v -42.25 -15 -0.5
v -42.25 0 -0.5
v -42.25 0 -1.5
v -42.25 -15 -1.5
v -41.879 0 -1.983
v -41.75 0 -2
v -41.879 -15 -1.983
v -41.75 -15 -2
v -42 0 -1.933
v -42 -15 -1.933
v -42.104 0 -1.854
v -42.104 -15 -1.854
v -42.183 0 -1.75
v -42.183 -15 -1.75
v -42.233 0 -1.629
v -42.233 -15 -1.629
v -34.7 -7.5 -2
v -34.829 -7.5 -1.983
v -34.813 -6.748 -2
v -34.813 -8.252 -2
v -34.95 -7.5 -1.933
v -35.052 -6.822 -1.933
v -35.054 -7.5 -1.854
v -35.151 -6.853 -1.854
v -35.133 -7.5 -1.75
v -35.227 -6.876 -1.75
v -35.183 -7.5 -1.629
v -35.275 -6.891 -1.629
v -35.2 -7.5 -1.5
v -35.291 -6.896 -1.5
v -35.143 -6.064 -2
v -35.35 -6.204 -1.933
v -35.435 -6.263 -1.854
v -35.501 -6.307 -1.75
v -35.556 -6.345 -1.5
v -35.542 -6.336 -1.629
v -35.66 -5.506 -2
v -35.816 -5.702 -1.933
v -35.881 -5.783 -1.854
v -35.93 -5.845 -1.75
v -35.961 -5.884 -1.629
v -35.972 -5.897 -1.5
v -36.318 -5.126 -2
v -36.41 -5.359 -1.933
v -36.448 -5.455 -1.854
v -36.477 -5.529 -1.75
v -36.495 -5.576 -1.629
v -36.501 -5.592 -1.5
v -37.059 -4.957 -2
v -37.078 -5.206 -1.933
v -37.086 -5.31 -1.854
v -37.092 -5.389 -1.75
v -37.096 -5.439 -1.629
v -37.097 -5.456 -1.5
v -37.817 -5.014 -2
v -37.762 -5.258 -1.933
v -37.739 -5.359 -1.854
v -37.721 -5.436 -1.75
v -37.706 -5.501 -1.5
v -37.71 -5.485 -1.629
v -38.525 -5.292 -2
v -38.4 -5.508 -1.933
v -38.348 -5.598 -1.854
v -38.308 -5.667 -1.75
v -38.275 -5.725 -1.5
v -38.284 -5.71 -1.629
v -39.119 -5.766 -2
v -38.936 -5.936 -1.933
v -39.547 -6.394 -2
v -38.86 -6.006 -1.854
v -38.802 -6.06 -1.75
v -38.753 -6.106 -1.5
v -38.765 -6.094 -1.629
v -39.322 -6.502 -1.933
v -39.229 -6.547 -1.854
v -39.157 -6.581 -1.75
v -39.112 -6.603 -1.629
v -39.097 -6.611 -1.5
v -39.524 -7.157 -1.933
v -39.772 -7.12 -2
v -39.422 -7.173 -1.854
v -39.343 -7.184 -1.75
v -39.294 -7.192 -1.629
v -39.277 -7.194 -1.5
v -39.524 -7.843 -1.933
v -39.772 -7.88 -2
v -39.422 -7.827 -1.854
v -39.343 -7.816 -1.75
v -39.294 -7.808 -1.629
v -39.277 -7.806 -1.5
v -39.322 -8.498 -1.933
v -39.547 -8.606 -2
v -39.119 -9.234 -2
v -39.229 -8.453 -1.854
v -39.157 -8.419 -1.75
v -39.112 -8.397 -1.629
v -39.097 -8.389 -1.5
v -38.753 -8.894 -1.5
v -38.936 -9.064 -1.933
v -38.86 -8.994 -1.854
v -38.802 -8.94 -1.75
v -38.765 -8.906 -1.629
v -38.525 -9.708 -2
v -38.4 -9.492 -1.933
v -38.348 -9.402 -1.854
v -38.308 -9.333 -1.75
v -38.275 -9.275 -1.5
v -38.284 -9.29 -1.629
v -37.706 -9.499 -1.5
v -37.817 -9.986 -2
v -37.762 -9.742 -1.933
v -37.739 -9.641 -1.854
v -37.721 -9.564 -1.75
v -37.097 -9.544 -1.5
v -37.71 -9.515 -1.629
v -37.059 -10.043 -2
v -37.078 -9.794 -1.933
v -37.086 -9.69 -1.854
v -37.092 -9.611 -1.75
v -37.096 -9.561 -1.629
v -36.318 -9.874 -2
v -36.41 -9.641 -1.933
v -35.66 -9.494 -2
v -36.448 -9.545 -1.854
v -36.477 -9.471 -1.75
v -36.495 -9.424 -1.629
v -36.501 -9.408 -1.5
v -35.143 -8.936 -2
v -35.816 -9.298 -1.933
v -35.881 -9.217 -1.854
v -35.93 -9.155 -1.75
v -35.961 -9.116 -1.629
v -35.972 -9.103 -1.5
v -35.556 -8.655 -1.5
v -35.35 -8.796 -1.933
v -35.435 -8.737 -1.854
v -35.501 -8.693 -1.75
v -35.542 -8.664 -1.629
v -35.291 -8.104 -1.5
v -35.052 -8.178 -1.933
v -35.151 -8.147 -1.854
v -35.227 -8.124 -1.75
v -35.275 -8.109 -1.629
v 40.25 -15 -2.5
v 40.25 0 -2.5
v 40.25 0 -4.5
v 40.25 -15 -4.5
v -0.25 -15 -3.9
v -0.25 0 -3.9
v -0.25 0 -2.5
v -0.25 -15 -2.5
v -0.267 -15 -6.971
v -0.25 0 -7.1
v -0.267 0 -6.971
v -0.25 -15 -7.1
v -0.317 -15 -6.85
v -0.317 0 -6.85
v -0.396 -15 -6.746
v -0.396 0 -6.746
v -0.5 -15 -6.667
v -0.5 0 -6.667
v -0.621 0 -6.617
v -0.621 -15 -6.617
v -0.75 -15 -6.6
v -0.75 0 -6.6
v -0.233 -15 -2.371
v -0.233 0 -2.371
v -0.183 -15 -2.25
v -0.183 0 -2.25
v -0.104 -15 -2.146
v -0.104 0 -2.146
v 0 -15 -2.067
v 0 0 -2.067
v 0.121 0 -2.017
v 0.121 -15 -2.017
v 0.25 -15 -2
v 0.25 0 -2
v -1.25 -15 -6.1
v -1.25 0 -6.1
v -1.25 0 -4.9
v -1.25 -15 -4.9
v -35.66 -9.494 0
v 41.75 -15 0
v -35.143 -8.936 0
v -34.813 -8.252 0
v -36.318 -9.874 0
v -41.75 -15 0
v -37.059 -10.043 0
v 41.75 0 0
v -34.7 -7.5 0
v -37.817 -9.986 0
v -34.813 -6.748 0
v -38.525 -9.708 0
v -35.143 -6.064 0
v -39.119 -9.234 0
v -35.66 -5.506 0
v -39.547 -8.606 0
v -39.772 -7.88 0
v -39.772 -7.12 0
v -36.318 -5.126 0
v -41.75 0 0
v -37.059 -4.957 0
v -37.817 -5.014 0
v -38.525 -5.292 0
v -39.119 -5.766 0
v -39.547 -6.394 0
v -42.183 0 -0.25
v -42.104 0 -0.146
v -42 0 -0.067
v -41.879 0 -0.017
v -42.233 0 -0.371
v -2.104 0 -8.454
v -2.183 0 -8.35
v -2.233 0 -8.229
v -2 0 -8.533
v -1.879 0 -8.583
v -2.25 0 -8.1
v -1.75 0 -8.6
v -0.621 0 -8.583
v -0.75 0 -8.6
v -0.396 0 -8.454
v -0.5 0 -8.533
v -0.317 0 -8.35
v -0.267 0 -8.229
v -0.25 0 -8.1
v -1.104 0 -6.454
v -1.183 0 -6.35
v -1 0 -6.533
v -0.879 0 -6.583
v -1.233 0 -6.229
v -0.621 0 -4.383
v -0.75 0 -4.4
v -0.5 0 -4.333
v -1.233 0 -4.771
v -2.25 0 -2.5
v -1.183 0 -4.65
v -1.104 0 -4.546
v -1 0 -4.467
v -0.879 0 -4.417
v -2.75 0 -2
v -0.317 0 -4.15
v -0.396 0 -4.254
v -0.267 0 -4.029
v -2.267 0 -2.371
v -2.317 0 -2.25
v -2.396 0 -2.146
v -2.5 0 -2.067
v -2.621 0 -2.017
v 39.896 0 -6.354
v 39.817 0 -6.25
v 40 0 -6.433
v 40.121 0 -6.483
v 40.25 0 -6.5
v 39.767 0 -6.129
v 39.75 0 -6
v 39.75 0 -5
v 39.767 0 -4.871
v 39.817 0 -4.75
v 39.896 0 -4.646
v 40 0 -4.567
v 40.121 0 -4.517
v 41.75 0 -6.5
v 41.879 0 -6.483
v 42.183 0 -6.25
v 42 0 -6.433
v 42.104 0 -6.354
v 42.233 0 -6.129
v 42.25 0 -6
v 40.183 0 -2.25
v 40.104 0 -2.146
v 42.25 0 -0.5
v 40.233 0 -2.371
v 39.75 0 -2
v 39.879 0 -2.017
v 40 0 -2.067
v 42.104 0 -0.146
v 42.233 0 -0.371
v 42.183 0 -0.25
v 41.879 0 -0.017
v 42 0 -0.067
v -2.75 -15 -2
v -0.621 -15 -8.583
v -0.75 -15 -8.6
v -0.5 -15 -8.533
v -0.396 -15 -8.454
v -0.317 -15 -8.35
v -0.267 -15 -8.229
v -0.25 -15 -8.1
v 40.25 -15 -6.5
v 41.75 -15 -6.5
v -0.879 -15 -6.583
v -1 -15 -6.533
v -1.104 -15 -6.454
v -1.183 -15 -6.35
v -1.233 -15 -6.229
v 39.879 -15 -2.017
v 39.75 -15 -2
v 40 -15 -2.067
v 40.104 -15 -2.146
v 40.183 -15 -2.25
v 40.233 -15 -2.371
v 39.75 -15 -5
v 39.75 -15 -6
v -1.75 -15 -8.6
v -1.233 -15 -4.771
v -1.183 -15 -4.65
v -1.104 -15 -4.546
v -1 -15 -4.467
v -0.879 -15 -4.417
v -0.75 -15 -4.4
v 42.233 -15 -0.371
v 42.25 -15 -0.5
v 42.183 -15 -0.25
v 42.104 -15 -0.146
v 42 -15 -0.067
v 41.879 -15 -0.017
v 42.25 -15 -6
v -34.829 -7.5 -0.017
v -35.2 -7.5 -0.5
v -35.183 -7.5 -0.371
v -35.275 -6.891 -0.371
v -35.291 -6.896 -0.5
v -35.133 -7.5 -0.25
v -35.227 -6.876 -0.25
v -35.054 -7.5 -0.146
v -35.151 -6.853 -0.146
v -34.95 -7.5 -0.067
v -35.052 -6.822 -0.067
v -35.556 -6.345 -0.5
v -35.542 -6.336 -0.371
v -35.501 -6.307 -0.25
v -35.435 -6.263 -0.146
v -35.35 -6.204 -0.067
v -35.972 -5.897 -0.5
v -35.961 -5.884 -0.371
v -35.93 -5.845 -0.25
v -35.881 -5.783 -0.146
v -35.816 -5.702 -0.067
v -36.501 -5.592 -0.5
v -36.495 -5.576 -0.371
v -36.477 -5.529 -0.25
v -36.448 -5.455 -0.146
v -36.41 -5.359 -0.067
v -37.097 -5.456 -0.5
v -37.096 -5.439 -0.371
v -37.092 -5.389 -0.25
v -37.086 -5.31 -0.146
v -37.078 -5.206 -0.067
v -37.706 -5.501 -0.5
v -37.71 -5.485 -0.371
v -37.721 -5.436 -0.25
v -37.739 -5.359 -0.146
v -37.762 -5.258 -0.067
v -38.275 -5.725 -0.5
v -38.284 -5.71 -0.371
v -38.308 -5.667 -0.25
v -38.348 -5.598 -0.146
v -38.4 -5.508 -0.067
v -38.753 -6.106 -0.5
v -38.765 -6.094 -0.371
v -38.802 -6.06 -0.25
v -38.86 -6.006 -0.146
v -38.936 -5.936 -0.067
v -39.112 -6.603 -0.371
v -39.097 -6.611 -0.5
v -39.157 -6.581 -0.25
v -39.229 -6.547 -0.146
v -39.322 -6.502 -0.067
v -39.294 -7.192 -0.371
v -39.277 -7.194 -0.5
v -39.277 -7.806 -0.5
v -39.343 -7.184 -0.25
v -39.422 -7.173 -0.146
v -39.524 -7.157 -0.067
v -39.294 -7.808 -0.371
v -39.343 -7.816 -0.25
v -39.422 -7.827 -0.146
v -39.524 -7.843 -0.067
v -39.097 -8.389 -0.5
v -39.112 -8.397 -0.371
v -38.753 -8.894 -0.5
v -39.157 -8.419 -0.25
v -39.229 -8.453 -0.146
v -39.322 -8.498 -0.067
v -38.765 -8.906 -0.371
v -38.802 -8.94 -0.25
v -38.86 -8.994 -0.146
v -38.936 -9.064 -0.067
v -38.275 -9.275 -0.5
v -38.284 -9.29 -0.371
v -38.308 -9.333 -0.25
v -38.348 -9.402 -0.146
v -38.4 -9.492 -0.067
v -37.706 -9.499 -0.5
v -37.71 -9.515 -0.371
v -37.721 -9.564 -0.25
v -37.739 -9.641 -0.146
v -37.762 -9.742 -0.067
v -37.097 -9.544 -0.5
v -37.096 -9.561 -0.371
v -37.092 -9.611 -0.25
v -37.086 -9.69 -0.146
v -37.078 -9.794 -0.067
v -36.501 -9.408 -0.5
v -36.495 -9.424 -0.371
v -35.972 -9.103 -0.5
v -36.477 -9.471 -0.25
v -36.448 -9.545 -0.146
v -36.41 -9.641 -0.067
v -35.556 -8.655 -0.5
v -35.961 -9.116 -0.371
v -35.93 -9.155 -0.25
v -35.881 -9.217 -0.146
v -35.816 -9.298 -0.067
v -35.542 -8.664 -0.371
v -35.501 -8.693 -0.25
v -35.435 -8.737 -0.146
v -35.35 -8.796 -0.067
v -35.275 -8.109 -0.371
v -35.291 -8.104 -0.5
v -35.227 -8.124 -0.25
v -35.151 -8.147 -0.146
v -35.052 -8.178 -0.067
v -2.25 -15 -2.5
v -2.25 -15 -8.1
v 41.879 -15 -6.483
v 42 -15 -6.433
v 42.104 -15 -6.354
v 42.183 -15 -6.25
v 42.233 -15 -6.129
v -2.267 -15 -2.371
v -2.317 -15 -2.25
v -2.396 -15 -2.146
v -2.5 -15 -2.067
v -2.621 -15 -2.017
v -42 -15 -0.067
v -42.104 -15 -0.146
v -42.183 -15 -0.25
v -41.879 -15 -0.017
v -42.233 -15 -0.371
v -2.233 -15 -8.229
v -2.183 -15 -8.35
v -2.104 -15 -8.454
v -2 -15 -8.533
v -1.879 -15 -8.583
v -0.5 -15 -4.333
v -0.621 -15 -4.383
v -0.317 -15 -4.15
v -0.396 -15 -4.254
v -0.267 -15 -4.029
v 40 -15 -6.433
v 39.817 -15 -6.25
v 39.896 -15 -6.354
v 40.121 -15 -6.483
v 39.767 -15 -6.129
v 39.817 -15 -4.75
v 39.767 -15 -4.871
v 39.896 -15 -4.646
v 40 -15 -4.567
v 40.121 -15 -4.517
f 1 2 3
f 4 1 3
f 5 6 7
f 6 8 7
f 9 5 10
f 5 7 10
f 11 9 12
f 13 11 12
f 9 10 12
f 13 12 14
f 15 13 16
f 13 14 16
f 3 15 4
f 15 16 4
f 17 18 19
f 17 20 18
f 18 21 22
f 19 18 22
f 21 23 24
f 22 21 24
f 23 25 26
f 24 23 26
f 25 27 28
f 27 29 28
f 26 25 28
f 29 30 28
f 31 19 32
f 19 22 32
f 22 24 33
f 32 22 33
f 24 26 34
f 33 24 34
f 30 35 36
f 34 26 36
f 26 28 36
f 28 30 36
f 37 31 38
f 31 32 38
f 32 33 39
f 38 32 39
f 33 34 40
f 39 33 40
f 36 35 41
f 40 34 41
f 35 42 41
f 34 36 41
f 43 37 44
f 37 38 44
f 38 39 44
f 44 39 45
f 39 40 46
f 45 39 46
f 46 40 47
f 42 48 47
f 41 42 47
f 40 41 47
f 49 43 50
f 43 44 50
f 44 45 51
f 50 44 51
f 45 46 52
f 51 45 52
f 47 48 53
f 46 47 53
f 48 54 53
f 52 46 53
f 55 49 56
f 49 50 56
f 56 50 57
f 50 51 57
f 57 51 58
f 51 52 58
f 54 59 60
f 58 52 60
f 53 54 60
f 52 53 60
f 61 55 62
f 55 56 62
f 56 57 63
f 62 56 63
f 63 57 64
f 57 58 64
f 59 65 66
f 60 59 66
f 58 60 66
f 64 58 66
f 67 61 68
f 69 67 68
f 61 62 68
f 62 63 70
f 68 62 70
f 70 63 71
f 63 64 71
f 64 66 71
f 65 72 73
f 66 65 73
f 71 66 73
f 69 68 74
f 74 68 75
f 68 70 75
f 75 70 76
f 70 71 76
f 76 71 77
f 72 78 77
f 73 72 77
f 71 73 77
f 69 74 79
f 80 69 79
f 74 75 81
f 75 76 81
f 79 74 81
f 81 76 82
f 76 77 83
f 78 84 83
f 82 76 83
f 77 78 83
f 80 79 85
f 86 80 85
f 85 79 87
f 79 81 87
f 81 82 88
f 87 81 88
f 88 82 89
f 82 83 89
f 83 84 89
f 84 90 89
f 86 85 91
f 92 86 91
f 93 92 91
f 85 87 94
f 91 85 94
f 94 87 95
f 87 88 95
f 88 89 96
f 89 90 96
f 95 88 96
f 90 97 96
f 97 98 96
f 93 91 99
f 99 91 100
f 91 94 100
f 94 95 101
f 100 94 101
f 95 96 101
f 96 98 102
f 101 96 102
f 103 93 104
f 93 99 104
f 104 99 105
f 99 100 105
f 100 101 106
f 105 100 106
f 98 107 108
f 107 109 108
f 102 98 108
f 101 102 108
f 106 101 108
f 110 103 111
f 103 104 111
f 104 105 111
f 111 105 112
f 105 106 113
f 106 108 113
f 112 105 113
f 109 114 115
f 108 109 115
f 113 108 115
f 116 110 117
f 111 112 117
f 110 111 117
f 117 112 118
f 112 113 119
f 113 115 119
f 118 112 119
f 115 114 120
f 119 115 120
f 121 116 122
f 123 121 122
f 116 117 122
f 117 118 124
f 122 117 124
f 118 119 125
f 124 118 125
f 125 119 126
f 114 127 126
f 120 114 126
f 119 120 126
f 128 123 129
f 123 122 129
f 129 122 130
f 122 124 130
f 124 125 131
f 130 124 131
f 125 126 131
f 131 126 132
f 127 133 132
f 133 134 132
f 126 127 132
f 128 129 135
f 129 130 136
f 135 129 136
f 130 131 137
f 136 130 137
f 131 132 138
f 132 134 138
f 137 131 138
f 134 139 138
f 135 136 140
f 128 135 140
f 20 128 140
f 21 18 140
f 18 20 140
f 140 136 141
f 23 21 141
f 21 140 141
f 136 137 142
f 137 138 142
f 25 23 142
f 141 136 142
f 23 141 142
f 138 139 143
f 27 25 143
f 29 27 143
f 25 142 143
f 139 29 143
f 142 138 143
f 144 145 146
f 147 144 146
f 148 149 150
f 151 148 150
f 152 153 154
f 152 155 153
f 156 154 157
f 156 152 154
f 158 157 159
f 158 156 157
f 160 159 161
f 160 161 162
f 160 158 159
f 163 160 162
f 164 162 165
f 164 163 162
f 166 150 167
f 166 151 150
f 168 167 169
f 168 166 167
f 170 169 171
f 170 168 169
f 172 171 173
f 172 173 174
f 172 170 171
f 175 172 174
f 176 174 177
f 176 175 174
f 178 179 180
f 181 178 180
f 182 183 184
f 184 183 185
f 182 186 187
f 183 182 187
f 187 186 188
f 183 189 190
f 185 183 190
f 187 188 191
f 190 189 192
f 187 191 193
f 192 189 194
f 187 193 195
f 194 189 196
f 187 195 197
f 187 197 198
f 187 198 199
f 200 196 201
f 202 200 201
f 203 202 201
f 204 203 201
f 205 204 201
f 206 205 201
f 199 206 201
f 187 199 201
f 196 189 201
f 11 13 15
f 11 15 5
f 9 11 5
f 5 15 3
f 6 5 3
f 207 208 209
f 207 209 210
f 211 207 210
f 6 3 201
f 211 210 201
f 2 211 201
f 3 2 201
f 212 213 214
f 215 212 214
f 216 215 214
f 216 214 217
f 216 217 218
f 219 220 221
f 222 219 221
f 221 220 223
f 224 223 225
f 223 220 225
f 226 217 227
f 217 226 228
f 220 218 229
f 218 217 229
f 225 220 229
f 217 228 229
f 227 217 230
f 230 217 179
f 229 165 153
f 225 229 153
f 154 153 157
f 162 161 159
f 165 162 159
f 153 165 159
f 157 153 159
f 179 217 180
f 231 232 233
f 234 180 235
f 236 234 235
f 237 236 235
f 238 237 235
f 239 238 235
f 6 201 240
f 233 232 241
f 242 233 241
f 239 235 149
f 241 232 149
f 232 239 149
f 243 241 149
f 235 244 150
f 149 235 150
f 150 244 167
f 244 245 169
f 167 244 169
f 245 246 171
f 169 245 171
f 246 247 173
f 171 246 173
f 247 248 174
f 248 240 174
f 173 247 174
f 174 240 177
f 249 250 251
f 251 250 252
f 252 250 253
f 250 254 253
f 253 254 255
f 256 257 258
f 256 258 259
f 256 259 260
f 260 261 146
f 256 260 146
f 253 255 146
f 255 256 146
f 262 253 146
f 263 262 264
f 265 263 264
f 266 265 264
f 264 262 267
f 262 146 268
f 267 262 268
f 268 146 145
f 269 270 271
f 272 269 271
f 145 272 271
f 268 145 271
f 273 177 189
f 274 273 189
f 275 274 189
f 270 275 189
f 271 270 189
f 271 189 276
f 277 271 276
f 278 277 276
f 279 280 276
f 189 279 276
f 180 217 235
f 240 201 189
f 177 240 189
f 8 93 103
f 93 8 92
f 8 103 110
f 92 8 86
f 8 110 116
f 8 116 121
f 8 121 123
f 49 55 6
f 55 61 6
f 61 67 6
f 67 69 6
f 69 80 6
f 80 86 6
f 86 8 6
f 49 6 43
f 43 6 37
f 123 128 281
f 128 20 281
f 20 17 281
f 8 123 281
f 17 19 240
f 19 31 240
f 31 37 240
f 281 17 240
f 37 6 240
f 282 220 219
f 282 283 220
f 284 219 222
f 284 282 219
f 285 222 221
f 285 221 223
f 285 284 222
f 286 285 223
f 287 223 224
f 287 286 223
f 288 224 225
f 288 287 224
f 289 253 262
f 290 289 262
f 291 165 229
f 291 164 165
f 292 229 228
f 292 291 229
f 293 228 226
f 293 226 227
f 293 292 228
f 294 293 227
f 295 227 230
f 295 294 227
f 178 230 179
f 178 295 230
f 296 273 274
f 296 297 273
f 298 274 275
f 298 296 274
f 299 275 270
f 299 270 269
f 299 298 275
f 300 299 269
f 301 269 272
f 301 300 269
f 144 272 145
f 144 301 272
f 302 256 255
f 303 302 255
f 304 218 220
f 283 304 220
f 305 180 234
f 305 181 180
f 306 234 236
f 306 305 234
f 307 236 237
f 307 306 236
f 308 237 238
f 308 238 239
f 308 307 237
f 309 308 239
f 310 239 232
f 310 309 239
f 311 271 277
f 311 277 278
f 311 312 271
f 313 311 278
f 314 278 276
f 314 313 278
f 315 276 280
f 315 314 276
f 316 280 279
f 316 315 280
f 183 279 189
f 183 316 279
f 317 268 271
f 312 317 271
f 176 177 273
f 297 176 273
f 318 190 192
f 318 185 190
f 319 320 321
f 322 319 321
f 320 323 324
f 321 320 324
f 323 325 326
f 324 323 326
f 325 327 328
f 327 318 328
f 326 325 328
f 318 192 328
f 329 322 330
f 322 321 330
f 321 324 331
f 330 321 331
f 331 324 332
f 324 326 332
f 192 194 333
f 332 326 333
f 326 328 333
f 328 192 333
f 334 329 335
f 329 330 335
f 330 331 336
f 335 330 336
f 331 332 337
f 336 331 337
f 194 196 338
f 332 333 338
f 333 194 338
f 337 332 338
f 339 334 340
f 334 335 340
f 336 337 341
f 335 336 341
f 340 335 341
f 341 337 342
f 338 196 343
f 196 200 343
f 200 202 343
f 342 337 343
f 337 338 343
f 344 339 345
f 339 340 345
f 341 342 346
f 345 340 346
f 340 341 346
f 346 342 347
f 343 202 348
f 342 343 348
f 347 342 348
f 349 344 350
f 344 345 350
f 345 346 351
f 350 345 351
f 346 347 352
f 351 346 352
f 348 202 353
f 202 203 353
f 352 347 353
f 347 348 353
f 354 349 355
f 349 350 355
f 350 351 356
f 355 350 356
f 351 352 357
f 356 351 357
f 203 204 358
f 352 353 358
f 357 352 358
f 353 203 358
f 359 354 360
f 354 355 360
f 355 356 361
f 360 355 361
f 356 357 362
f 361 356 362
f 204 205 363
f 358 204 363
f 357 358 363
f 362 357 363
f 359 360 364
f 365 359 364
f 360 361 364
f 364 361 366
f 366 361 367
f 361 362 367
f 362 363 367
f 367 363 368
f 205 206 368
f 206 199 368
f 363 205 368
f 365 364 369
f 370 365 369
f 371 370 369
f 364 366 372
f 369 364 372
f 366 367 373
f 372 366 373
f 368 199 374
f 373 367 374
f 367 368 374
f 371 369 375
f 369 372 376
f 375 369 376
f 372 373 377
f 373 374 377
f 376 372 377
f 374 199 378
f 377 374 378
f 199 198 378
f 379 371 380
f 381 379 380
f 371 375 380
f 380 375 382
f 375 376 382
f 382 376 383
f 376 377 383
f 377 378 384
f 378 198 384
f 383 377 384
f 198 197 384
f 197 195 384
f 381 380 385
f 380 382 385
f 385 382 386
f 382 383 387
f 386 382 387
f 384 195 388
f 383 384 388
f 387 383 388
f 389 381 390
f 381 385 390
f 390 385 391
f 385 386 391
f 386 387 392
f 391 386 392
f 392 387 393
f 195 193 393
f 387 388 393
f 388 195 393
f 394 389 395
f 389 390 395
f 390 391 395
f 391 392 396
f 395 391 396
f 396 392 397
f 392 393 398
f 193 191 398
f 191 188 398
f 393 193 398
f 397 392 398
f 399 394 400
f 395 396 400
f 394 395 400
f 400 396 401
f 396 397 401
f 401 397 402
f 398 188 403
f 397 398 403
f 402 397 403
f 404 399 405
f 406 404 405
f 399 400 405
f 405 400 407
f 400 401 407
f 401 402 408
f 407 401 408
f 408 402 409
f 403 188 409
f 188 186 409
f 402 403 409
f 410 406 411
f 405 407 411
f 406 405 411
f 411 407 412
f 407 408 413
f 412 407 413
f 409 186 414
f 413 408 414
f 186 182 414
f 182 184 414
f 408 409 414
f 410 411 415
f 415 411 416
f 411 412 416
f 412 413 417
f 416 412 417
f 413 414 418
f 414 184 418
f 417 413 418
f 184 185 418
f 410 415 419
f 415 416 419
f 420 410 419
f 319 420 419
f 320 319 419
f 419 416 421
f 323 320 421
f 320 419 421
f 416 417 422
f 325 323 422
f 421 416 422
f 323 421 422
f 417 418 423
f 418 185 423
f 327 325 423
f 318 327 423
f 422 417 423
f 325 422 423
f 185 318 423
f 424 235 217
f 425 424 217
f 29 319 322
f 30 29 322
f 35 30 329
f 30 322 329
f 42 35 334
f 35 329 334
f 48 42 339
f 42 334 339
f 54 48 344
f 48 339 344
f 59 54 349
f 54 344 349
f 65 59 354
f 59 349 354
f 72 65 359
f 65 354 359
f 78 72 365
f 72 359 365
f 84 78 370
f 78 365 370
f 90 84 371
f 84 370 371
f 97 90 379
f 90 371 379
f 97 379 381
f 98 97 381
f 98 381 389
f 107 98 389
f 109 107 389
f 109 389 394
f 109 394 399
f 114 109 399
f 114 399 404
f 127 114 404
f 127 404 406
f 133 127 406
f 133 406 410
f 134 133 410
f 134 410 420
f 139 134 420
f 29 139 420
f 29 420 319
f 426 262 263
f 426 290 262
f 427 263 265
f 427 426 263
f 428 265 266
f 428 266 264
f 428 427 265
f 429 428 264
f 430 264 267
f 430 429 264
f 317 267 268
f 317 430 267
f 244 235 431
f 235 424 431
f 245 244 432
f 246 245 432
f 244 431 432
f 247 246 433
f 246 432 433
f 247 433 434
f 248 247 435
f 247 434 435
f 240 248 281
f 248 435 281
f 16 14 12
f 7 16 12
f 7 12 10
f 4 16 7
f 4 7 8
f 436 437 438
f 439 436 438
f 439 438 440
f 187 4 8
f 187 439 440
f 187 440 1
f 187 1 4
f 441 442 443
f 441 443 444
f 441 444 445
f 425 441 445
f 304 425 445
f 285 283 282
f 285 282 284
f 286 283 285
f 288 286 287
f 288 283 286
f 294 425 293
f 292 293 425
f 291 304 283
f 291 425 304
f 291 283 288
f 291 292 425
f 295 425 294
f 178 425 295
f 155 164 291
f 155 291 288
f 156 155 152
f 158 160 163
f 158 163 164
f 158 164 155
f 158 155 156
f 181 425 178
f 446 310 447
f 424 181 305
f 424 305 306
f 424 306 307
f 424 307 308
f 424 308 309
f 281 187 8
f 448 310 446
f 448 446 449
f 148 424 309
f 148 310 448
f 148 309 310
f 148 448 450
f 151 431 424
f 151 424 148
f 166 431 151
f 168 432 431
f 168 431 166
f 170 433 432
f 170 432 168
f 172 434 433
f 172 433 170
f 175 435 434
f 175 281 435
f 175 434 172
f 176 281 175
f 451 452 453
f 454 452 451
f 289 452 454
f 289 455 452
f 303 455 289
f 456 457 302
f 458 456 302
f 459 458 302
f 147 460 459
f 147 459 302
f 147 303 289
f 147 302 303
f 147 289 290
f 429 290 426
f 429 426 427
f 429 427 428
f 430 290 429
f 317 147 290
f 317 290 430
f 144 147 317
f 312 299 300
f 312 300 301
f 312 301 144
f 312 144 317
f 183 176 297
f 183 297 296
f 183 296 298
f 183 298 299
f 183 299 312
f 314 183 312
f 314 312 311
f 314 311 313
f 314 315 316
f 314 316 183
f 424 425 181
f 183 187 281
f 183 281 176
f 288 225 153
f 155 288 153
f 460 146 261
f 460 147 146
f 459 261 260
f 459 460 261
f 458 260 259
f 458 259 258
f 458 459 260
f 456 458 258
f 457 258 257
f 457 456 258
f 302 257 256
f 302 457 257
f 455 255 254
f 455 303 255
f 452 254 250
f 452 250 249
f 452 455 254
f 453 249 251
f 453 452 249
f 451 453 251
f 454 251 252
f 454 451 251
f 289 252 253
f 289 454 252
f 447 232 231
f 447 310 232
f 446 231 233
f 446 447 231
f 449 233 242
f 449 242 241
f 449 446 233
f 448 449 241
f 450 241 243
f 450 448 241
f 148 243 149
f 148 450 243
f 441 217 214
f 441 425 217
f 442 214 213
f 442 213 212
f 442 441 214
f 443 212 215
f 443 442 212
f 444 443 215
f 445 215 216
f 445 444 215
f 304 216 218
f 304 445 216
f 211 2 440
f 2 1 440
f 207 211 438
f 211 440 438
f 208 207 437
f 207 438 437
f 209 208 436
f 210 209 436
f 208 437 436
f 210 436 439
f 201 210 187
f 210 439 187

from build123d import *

# Parameters (mm, degrees)
F1_DEPTH = 15
F2_R     = 2.05
F3_DEPTH = 25
F4_R     = 0.49999


# Not quite as in the source:
# - a fillet or chamfer is up to 0.001 mm smaller than in the source, because OpenCascade refuses the exact size


with BuildPart() as f1:
    # F0 (on Front) → F1 (new body)
    with BuildSketch(Plane.XZ):
        Polygon((-0.25, -2), (-2.25, -2), (-2.25, -8.6), (-0.25, -8.6), (-0.25, -6.6), (-1.25, -6.6), (-1.25, -4.4), (-0.25, -4.4), align=None)
        Polygon((42.25, 0), (-42.25, 0), (-42.25, -2), (-2.25, -2), (-0.25, -2), (40.25, -2), (42.25, -2), align=None)
        Polygon((42.25, -6.5), (42.25, -2), (40.25, -2), (40.25, -4.5), (39.75, -4.5), (39.75, -6.5), align=None)
    extrude(amount=F1_DEPTH)

    # F2 (on face) → F3 (cut)
    with BuildSketch(Plane.XY):
        with Locations((-37.25, -7.5)):
            Circle(F2_R)
    extrude(amount=-F3_DEPTH, mode=Mode.SUBTRACT)

    # F4 (radius 0.5 in the source; OpenCascade refuses exactly that, so slightly less here)
    f4_edges = [f1.edges().sort_by_distance(p)[0] for p in [
        (-1.25, -7.5, -6.6),
        (-0.25, -7.5, -8.6),
        (39.75, -7.5, -6.5),
        (39.75, -7.5, -4.5),
        (-39.3, -7.5, 0),
        (42.25, -7.5, 0),
        (42.25, -7.5, -6.5),
        (-42.25, -7.5, 0),
        (-42.25, -7.5, -2),
        (-2.25, -7.5, -2),
        (-0.25, -7.5, -2),
        (40.25, -7.5, -2),
        (-2.25, -7.5, -8.6),
        (-39.3, -7.5, -2),
        (-0.25, -7.5, -4.4),
        (-1.25, -7.5, -4.4),
        (-0.25, -7.5, -6.6),
    ]]
    fillet(f4_edges, radius=F4_R)


solid = f1.part
